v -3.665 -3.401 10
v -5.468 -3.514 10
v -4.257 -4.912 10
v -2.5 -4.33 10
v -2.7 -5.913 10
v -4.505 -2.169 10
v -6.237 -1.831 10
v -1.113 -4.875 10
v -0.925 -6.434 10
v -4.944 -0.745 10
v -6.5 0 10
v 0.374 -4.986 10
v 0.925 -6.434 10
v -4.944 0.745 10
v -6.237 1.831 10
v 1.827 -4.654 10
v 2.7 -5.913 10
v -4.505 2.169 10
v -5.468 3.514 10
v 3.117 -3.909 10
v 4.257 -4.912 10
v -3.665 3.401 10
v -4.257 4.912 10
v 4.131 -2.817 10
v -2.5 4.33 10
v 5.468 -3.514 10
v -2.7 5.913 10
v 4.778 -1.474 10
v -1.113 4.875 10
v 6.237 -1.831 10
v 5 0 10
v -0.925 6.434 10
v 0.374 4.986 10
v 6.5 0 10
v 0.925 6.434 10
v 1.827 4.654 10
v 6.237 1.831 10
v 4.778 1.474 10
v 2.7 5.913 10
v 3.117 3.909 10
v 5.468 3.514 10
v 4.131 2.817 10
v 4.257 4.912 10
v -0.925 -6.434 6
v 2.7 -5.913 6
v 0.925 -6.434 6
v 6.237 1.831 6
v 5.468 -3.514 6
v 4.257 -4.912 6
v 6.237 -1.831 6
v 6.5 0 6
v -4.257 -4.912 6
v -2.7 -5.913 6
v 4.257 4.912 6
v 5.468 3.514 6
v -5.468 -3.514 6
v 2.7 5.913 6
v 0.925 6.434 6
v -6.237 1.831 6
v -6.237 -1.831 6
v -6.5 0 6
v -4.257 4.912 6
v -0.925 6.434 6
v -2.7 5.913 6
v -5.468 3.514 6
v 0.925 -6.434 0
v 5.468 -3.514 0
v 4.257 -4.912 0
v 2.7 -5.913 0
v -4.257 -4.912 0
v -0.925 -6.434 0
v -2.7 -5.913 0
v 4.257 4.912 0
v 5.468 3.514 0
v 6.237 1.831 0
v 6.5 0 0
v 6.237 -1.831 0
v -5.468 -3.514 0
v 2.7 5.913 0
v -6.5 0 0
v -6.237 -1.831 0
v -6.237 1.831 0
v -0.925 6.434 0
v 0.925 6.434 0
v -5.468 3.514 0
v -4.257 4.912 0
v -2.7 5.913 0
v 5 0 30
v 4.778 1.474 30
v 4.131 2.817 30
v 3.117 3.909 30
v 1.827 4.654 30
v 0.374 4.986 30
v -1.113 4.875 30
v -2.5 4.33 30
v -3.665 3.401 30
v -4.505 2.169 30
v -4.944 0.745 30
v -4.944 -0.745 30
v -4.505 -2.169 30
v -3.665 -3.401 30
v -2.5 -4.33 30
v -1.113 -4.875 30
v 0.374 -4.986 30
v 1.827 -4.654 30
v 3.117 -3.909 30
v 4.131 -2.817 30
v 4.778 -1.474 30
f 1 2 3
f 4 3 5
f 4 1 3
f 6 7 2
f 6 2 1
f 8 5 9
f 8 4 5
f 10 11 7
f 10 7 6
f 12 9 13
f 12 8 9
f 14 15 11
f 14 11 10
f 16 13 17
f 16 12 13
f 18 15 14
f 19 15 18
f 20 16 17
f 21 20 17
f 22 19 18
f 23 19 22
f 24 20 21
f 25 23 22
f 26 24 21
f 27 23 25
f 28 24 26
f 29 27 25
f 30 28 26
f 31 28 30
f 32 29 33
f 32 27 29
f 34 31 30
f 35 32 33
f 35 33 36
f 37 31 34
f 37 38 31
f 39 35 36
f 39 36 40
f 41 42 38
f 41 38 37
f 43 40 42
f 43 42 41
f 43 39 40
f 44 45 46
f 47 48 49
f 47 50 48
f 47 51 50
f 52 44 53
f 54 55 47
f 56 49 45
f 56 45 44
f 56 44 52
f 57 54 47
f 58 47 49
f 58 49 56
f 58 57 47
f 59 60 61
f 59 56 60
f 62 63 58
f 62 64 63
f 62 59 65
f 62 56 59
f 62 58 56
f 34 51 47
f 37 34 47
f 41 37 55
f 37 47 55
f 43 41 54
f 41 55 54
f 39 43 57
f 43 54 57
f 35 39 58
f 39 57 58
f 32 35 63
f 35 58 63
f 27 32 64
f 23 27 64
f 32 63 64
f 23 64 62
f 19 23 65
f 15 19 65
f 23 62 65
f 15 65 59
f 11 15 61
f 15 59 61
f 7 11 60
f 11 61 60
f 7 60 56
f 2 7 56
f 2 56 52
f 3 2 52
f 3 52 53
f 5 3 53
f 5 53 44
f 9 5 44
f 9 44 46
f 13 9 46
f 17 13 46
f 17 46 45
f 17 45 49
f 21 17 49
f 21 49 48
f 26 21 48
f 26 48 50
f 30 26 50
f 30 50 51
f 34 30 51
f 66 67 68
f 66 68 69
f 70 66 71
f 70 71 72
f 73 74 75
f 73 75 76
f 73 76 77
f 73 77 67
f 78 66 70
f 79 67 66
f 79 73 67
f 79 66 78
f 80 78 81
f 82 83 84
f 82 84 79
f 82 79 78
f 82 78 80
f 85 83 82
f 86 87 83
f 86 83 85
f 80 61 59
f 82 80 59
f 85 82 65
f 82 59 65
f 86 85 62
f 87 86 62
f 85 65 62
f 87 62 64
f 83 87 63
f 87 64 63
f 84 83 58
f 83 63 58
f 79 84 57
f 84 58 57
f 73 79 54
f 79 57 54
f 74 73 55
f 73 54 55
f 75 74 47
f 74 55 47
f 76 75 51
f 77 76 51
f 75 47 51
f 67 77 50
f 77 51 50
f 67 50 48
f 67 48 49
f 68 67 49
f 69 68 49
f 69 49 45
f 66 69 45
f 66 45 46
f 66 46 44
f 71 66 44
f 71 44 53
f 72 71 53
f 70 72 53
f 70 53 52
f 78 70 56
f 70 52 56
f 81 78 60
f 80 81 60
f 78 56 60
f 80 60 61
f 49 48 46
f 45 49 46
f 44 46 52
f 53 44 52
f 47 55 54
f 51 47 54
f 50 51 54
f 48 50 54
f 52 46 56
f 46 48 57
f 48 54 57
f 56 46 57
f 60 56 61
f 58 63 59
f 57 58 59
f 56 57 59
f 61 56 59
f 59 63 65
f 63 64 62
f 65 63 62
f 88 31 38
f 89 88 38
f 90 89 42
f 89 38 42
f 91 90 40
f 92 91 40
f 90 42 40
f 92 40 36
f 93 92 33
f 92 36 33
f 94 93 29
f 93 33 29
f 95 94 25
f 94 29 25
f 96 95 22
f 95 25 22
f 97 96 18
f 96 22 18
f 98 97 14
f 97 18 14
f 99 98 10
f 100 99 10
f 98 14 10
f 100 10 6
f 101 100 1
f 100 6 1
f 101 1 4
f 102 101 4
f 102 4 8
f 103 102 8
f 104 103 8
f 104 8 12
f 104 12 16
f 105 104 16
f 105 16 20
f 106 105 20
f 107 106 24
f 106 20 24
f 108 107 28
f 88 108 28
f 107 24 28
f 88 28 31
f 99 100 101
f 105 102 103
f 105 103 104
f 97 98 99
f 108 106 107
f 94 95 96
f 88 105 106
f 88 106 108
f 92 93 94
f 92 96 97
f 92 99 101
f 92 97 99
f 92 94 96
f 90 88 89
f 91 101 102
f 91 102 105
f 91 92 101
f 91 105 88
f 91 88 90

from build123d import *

# Parameters (mm, degrees)
ESQUISSE1_R             = 6.5
BOSS_EXTRU_1_DEPTH      = 10
ESQUISSE2_R             = 5
BOSS_EXTRU_2_DEPTH      = 20
ESQUISSE3_R             = 6.5
ENL_V_MAT_EXTRU_1_DEPTH = 6
ESQUISSE5_R             = 6.5
BOSS_EXTRU_4_DEPTH      = 6


with BuildPart() as part:
    # Esquisse1 → Boss.-Extru.1 (new body)
    with BuildSketch(Plane.XY):
        Circle(ESQUISSE1_R)
    extrude(amount=BOSS_EXTRU_1_DEPTH)

    # Esquisse2 → Boss.-Extru.2 (add)
    with BuildSketch(Plane.XY.offset(10)):
        Circle(ESQUISSE2_R)
    extrude(amount=BOSS_EXTRU_2_DEPTH)

    # Esquisse3 → Enlèv. mat.-Extru.1 (cut)
    with BuildSketch(Plane(origin=(0, 0, 0), x_dir=(-1, 0, 0), z_dir=(0, 0, -1))):
        Circle(ESQUISSE3_R)
    extrude(amount=-ENL_V_MAT_EXTRU_1_DEPTH, mode=Mode.SUBTRACT)


with BuildPart() as body_2:
    # Esquisse5 → Boss.-Extru.4 (new body)
    with BuildSketch(Plane(origin=(0, 0, 6), x_dir=(-1, 0, 0), z_dir=(0, 0, -1))):
        Circle(ESQUISSE5_R)
    extrude(amount=BOSS_EXTRU_4_DEPTH)


solid = Compound([part.part, body_2.part])
